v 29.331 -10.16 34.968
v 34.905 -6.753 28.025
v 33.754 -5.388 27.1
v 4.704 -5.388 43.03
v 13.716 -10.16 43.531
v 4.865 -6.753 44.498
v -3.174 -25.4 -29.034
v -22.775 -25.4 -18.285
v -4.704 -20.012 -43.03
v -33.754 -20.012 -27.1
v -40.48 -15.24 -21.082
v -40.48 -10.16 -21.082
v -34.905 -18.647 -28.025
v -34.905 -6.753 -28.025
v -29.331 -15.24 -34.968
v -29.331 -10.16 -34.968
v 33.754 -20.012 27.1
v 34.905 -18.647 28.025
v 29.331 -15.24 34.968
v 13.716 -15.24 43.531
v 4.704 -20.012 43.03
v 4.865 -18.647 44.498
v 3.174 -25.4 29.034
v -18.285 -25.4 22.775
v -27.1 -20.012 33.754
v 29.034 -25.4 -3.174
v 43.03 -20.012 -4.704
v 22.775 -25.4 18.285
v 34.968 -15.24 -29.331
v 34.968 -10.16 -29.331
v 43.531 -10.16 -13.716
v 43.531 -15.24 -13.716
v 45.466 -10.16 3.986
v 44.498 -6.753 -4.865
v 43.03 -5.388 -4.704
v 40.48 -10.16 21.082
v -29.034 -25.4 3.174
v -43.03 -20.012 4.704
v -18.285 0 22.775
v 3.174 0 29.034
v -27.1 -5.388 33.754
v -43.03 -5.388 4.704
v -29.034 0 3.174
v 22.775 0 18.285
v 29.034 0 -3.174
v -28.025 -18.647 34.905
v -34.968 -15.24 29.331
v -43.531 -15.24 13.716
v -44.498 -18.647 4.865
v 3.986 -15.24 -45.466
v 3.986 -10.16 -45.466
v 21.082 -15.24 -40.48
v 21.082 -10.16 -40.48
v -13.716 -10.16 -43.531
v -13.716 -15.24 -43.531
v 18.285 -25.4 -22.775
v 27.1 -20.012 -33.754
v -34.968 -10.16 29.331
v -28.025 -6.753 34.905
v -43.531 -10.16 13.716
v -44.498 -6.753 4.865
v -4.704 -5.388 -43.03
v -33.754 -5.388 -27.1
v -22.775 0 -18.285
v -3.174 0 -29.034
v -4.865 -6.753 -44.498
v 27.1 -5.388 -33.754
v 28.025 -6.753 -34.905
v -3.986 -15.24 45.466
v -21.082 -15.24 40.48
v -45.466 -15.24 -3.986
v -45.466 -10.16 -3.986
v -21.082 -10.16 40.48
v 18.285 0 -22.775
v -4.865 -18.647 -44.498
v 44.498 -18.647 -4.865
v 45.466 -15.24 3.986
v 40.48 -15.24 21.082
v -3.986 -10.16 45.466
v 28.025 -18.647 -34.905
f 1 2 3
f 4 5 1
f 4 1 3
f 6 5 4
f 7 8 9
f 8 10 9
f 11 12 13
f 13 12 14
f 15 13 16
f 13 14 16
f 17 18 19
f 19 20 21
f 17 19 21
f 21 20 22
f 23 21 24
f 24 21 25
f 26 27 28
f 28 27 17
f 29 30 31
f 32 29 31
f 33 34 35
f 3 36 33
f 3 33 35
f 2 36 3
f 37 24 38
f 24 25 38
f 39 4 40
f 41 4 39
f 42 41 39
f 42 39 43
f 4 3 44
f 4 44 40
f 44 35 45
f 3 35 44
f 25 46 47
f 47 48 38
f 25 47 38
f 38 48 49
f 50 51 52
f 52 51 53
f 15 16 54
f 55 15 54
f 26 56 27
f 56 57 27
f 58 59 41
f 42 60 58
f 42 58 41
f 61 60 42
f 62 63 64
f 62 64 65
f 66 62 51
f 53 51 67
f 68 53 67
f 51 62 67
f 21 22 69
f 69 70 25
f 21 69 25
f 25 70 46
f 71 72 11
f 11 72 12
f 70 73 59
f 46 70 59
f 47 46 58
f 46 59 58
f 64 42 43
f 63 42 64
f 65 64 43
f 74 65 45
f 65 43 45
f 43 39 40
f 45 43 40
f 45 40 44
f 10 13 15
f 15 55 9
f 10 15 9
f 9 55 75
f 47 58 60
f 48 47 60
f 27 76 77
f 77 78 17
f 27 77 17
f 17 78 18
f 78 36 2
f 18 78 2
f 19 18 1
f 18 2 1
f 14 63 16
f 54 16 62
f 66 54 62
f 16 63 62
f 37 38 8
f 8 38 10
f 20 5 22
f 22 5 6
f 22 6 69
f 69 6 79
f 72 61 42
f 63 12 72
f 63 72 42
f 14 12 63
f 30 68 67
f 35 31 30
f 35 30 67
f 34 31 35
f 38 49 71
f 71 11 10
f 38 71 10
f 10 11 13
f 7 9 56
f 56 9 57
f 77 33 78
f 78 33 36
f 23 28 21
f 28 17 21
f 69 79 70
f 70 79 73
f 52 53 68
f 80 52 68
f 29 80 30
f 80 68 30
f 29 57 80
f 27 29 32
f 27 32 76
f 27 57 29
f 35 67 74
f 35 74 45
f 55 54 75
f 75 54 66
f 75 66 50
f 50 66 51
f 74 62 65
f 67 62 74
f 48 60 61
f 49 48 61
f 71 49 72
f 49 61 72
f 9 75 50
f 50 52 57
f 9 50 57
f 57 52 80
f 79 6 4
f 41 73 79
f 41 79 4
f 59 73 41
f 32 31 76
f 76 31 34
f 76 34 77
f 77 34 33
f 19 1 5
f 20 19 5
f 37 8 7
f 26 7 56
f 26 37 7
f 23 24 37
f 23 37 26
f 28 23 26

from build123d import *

# Parameters (mm, degrees)
F1_DEPTH = 25.4
F2_SIZE  = 10.16
F3_SIZE  = 7.62
F4_SIZE  = 7.62
F5_SIZE  = 10.16
F6_SIZE  = 7.62


with BuildPart() as f1:
    # F0 (on Front) → F1 (new body)
    with BuildSketch(Plane.XZ):
        Polygon((40.479728647, 21.0820164172), (29.3306543749, 34.9681649717), (13.7162538572, 43.5307273965), (-3.986321972, 45.4661311822), (-21.0820164172, 40.479728647), (-34.9681649717, 29.3306543749), (-43.5307273965, 13.7162538572), (-45.4661311822, -3.986321972), (-40.479728647, -21.0820164172), (-29.3306543749, -34.9681649717), (-13.7162538572, -43.5307273965), (3.986321972, -45.4661311822), (21.0820164172, -40.479728647), (34.9681649717, -29.3306543749), (43.5307273965, -13.7162538572), (45.4661311822, 3.986321972), align=None)
    extrude(amount=F1_DEPTH)

    # F2 (call 1 of 8: OpenCascade refuses the feature's edges together)
    f2_edges = [f1.edges().sort_by_distance(p)[0] for p in [
        (39.249446, -25.4, -21.523454),
    ]]
    chamfer(f2_edges, length=F2_SIZE)

    # F2#2 (call 2 of 8)
    f2_2_edges = [f1.edges().sort_by_distance(p)[0] for p in [
        (42.97293, -25.4, 12.534169),
    ]]
    chamfer(f2_2_edges, length=F2_SIZE)

    # F2#3 (call 3 of 8)
    f2_3_edges = [f1.edges().sort_by_distance(p)[0] for p in [
        (21.523454, -25.4, 39.249446),
    ]]
    chamfer(f2_3_edges, length=F2_SIZE)

    # F2#4 (call 4 of 8)
    f2_4_edges = [f1.edges().sort_by_distance(p)[0] for p in [
        (-12.534169, -25.4, 42.97293),
    ]]
    chamfer(f2_4_edges, length=F2_SIZE)

    # F2#5 (call 5 of 8)
    f2_5_edges = [f1.edges().sort_by_distance(p)[0] for p in [
        (-39.249446, -25.4, 21.523454),
    ]]
    chamfer(f2_5_edges, length=F2_SIZE)

    # F2#6 (call 6 of 8)
    f2_6_edges = [f1.edges().sort_by_distance(p)[0] for p in [
        (-42.97293, -25.4, -12.534169),
    ]]
    chamfer(f2_6_edges, length=F2_SIZE)

    # F2#7 (call 7 of 8)
    f2_7_edges = [f1.edges().sort_by_distance(p)[0] for p in [
        (-21.523454, -25.4, -39.249446),
    ]]
    chamfer(f2_7_edges, length=F2_SIZE)

    # F2#8 (call 8 of 8)
    f2_8_edges = [f1.edges().sort_by_distance(p)[0] for p in [
        (12.534169, -25.4, -42.97293),
    ]]
    chamfer(f2_8_edges, length=F2_SIZE)

    # F3
    f3_edges = [f1.edges().sort_by_distance(p)[0] for p in [
        (-30.34099, -25.4, 16.638271),
        (16.638271, -25.4, 30.34099),
        (30.34099, -25.4, -16.638271),
        (-16.638271, -25.4, -30.34099),
    ]]
    chamfer(f3_edges, length=F3_SIZE)

    # F4
    f4_edges = [f1.edges().sort_by_distance(p)[0] for p in [
        (-9.689286, -25.4, 33.219354),
        (33.219354, -25.4, 9.689286),
        (9.689286, -25.4, -33.219354),
        (-33.219354, -25.4, -9.689286),
    ]]
    chamfer(f4_edges, length=F4_SIZE)

    # F5 (call 1 of 8: OpenCascade refuses the feature's edges together)
    f5_edges = [f1.edges().sort_by_distance(p)[0] for p in [
        (-21.523454, 0, -39.249446),
    ]]
    chamfer(f5_edges, length=F5_SIZE)

    # F5#2 (call 2 of 8)
    f5_2_edges = [f1.edges().sort_by_distance(p)[0] for p in [
        (12.534169, 0, -42.97293),
    ]]
    chamfer(f5_2_edges, length=F5_SIZE)

    # F5#3 (call 3 of 8)
    f5_3_edges = [f1.edges().sort_by_distance(p)[0] for p in [
        (39.249446, 0, -21.523454),
    ]]
    chamfer(f5_3_edges, length=F5_SIZE)

    # F5#4 (call 4 of 8)
    f5_4_edges = [f1.edges().sort_by_distance(p)[0] for p in [
        (42.97293, 0, 12.534169),
    ]]
    chamfer(f5_4_edges, length=F5_SIZE)

    # F5#5 (call 5 of 8)
    f5_5_edges = [f1.edges().sort_by_distance(p)[0] for p in [
        (21.523454, 0, 39.249446),
    ]]
    chamfer(f5_5_edges, length=F5_SIZE)

    # F5#6 (call 6 of 8)
    f5_6_edges = [f1.edges().sort_by_distance(p)[0] for p in [
        (-12.534169, 0, 42.97293),
    ]]
    chamfer(f5_6_edges, length=F5_SIZE)

    # F5#7 (call 7 of 8)
    f5_7_edges = [f1.edges().sort_by_distance(p)[0] for p in [
        (-39.249446, 0, 21.523454),
    ]]
    chamfer(f5_7_edges, length=F5_SIZE)

    # F5#8 (call 8 of 8)
    f5_8_edges = [f1.edges().sort_by_distance(p)[0] for p in [
        (-42.97293, 0, -12.534169),
    ]]
    chamfer(f5_8_edges, length=F5_SIZE)

    # F6
    f6_edges = [f1.edges().sort_by_distance(p)[0] for p in [
        (16.638271, 0, 30.34099),
        (-9.689286, 0, 33.219354),
        (-30.34099, 0, 16.638271),
        (-33.219354, 0, -9.689286),
        (-16.638271, 0, -30.34099),
        (9.689286, 0, -33.219354),
        (30.34099, 0, -16.638271),
        (33.219354, 0, 9.689286),
    ]]
    chamfer(f6_edges, length=F6_SIZE)


solid = f1.part
